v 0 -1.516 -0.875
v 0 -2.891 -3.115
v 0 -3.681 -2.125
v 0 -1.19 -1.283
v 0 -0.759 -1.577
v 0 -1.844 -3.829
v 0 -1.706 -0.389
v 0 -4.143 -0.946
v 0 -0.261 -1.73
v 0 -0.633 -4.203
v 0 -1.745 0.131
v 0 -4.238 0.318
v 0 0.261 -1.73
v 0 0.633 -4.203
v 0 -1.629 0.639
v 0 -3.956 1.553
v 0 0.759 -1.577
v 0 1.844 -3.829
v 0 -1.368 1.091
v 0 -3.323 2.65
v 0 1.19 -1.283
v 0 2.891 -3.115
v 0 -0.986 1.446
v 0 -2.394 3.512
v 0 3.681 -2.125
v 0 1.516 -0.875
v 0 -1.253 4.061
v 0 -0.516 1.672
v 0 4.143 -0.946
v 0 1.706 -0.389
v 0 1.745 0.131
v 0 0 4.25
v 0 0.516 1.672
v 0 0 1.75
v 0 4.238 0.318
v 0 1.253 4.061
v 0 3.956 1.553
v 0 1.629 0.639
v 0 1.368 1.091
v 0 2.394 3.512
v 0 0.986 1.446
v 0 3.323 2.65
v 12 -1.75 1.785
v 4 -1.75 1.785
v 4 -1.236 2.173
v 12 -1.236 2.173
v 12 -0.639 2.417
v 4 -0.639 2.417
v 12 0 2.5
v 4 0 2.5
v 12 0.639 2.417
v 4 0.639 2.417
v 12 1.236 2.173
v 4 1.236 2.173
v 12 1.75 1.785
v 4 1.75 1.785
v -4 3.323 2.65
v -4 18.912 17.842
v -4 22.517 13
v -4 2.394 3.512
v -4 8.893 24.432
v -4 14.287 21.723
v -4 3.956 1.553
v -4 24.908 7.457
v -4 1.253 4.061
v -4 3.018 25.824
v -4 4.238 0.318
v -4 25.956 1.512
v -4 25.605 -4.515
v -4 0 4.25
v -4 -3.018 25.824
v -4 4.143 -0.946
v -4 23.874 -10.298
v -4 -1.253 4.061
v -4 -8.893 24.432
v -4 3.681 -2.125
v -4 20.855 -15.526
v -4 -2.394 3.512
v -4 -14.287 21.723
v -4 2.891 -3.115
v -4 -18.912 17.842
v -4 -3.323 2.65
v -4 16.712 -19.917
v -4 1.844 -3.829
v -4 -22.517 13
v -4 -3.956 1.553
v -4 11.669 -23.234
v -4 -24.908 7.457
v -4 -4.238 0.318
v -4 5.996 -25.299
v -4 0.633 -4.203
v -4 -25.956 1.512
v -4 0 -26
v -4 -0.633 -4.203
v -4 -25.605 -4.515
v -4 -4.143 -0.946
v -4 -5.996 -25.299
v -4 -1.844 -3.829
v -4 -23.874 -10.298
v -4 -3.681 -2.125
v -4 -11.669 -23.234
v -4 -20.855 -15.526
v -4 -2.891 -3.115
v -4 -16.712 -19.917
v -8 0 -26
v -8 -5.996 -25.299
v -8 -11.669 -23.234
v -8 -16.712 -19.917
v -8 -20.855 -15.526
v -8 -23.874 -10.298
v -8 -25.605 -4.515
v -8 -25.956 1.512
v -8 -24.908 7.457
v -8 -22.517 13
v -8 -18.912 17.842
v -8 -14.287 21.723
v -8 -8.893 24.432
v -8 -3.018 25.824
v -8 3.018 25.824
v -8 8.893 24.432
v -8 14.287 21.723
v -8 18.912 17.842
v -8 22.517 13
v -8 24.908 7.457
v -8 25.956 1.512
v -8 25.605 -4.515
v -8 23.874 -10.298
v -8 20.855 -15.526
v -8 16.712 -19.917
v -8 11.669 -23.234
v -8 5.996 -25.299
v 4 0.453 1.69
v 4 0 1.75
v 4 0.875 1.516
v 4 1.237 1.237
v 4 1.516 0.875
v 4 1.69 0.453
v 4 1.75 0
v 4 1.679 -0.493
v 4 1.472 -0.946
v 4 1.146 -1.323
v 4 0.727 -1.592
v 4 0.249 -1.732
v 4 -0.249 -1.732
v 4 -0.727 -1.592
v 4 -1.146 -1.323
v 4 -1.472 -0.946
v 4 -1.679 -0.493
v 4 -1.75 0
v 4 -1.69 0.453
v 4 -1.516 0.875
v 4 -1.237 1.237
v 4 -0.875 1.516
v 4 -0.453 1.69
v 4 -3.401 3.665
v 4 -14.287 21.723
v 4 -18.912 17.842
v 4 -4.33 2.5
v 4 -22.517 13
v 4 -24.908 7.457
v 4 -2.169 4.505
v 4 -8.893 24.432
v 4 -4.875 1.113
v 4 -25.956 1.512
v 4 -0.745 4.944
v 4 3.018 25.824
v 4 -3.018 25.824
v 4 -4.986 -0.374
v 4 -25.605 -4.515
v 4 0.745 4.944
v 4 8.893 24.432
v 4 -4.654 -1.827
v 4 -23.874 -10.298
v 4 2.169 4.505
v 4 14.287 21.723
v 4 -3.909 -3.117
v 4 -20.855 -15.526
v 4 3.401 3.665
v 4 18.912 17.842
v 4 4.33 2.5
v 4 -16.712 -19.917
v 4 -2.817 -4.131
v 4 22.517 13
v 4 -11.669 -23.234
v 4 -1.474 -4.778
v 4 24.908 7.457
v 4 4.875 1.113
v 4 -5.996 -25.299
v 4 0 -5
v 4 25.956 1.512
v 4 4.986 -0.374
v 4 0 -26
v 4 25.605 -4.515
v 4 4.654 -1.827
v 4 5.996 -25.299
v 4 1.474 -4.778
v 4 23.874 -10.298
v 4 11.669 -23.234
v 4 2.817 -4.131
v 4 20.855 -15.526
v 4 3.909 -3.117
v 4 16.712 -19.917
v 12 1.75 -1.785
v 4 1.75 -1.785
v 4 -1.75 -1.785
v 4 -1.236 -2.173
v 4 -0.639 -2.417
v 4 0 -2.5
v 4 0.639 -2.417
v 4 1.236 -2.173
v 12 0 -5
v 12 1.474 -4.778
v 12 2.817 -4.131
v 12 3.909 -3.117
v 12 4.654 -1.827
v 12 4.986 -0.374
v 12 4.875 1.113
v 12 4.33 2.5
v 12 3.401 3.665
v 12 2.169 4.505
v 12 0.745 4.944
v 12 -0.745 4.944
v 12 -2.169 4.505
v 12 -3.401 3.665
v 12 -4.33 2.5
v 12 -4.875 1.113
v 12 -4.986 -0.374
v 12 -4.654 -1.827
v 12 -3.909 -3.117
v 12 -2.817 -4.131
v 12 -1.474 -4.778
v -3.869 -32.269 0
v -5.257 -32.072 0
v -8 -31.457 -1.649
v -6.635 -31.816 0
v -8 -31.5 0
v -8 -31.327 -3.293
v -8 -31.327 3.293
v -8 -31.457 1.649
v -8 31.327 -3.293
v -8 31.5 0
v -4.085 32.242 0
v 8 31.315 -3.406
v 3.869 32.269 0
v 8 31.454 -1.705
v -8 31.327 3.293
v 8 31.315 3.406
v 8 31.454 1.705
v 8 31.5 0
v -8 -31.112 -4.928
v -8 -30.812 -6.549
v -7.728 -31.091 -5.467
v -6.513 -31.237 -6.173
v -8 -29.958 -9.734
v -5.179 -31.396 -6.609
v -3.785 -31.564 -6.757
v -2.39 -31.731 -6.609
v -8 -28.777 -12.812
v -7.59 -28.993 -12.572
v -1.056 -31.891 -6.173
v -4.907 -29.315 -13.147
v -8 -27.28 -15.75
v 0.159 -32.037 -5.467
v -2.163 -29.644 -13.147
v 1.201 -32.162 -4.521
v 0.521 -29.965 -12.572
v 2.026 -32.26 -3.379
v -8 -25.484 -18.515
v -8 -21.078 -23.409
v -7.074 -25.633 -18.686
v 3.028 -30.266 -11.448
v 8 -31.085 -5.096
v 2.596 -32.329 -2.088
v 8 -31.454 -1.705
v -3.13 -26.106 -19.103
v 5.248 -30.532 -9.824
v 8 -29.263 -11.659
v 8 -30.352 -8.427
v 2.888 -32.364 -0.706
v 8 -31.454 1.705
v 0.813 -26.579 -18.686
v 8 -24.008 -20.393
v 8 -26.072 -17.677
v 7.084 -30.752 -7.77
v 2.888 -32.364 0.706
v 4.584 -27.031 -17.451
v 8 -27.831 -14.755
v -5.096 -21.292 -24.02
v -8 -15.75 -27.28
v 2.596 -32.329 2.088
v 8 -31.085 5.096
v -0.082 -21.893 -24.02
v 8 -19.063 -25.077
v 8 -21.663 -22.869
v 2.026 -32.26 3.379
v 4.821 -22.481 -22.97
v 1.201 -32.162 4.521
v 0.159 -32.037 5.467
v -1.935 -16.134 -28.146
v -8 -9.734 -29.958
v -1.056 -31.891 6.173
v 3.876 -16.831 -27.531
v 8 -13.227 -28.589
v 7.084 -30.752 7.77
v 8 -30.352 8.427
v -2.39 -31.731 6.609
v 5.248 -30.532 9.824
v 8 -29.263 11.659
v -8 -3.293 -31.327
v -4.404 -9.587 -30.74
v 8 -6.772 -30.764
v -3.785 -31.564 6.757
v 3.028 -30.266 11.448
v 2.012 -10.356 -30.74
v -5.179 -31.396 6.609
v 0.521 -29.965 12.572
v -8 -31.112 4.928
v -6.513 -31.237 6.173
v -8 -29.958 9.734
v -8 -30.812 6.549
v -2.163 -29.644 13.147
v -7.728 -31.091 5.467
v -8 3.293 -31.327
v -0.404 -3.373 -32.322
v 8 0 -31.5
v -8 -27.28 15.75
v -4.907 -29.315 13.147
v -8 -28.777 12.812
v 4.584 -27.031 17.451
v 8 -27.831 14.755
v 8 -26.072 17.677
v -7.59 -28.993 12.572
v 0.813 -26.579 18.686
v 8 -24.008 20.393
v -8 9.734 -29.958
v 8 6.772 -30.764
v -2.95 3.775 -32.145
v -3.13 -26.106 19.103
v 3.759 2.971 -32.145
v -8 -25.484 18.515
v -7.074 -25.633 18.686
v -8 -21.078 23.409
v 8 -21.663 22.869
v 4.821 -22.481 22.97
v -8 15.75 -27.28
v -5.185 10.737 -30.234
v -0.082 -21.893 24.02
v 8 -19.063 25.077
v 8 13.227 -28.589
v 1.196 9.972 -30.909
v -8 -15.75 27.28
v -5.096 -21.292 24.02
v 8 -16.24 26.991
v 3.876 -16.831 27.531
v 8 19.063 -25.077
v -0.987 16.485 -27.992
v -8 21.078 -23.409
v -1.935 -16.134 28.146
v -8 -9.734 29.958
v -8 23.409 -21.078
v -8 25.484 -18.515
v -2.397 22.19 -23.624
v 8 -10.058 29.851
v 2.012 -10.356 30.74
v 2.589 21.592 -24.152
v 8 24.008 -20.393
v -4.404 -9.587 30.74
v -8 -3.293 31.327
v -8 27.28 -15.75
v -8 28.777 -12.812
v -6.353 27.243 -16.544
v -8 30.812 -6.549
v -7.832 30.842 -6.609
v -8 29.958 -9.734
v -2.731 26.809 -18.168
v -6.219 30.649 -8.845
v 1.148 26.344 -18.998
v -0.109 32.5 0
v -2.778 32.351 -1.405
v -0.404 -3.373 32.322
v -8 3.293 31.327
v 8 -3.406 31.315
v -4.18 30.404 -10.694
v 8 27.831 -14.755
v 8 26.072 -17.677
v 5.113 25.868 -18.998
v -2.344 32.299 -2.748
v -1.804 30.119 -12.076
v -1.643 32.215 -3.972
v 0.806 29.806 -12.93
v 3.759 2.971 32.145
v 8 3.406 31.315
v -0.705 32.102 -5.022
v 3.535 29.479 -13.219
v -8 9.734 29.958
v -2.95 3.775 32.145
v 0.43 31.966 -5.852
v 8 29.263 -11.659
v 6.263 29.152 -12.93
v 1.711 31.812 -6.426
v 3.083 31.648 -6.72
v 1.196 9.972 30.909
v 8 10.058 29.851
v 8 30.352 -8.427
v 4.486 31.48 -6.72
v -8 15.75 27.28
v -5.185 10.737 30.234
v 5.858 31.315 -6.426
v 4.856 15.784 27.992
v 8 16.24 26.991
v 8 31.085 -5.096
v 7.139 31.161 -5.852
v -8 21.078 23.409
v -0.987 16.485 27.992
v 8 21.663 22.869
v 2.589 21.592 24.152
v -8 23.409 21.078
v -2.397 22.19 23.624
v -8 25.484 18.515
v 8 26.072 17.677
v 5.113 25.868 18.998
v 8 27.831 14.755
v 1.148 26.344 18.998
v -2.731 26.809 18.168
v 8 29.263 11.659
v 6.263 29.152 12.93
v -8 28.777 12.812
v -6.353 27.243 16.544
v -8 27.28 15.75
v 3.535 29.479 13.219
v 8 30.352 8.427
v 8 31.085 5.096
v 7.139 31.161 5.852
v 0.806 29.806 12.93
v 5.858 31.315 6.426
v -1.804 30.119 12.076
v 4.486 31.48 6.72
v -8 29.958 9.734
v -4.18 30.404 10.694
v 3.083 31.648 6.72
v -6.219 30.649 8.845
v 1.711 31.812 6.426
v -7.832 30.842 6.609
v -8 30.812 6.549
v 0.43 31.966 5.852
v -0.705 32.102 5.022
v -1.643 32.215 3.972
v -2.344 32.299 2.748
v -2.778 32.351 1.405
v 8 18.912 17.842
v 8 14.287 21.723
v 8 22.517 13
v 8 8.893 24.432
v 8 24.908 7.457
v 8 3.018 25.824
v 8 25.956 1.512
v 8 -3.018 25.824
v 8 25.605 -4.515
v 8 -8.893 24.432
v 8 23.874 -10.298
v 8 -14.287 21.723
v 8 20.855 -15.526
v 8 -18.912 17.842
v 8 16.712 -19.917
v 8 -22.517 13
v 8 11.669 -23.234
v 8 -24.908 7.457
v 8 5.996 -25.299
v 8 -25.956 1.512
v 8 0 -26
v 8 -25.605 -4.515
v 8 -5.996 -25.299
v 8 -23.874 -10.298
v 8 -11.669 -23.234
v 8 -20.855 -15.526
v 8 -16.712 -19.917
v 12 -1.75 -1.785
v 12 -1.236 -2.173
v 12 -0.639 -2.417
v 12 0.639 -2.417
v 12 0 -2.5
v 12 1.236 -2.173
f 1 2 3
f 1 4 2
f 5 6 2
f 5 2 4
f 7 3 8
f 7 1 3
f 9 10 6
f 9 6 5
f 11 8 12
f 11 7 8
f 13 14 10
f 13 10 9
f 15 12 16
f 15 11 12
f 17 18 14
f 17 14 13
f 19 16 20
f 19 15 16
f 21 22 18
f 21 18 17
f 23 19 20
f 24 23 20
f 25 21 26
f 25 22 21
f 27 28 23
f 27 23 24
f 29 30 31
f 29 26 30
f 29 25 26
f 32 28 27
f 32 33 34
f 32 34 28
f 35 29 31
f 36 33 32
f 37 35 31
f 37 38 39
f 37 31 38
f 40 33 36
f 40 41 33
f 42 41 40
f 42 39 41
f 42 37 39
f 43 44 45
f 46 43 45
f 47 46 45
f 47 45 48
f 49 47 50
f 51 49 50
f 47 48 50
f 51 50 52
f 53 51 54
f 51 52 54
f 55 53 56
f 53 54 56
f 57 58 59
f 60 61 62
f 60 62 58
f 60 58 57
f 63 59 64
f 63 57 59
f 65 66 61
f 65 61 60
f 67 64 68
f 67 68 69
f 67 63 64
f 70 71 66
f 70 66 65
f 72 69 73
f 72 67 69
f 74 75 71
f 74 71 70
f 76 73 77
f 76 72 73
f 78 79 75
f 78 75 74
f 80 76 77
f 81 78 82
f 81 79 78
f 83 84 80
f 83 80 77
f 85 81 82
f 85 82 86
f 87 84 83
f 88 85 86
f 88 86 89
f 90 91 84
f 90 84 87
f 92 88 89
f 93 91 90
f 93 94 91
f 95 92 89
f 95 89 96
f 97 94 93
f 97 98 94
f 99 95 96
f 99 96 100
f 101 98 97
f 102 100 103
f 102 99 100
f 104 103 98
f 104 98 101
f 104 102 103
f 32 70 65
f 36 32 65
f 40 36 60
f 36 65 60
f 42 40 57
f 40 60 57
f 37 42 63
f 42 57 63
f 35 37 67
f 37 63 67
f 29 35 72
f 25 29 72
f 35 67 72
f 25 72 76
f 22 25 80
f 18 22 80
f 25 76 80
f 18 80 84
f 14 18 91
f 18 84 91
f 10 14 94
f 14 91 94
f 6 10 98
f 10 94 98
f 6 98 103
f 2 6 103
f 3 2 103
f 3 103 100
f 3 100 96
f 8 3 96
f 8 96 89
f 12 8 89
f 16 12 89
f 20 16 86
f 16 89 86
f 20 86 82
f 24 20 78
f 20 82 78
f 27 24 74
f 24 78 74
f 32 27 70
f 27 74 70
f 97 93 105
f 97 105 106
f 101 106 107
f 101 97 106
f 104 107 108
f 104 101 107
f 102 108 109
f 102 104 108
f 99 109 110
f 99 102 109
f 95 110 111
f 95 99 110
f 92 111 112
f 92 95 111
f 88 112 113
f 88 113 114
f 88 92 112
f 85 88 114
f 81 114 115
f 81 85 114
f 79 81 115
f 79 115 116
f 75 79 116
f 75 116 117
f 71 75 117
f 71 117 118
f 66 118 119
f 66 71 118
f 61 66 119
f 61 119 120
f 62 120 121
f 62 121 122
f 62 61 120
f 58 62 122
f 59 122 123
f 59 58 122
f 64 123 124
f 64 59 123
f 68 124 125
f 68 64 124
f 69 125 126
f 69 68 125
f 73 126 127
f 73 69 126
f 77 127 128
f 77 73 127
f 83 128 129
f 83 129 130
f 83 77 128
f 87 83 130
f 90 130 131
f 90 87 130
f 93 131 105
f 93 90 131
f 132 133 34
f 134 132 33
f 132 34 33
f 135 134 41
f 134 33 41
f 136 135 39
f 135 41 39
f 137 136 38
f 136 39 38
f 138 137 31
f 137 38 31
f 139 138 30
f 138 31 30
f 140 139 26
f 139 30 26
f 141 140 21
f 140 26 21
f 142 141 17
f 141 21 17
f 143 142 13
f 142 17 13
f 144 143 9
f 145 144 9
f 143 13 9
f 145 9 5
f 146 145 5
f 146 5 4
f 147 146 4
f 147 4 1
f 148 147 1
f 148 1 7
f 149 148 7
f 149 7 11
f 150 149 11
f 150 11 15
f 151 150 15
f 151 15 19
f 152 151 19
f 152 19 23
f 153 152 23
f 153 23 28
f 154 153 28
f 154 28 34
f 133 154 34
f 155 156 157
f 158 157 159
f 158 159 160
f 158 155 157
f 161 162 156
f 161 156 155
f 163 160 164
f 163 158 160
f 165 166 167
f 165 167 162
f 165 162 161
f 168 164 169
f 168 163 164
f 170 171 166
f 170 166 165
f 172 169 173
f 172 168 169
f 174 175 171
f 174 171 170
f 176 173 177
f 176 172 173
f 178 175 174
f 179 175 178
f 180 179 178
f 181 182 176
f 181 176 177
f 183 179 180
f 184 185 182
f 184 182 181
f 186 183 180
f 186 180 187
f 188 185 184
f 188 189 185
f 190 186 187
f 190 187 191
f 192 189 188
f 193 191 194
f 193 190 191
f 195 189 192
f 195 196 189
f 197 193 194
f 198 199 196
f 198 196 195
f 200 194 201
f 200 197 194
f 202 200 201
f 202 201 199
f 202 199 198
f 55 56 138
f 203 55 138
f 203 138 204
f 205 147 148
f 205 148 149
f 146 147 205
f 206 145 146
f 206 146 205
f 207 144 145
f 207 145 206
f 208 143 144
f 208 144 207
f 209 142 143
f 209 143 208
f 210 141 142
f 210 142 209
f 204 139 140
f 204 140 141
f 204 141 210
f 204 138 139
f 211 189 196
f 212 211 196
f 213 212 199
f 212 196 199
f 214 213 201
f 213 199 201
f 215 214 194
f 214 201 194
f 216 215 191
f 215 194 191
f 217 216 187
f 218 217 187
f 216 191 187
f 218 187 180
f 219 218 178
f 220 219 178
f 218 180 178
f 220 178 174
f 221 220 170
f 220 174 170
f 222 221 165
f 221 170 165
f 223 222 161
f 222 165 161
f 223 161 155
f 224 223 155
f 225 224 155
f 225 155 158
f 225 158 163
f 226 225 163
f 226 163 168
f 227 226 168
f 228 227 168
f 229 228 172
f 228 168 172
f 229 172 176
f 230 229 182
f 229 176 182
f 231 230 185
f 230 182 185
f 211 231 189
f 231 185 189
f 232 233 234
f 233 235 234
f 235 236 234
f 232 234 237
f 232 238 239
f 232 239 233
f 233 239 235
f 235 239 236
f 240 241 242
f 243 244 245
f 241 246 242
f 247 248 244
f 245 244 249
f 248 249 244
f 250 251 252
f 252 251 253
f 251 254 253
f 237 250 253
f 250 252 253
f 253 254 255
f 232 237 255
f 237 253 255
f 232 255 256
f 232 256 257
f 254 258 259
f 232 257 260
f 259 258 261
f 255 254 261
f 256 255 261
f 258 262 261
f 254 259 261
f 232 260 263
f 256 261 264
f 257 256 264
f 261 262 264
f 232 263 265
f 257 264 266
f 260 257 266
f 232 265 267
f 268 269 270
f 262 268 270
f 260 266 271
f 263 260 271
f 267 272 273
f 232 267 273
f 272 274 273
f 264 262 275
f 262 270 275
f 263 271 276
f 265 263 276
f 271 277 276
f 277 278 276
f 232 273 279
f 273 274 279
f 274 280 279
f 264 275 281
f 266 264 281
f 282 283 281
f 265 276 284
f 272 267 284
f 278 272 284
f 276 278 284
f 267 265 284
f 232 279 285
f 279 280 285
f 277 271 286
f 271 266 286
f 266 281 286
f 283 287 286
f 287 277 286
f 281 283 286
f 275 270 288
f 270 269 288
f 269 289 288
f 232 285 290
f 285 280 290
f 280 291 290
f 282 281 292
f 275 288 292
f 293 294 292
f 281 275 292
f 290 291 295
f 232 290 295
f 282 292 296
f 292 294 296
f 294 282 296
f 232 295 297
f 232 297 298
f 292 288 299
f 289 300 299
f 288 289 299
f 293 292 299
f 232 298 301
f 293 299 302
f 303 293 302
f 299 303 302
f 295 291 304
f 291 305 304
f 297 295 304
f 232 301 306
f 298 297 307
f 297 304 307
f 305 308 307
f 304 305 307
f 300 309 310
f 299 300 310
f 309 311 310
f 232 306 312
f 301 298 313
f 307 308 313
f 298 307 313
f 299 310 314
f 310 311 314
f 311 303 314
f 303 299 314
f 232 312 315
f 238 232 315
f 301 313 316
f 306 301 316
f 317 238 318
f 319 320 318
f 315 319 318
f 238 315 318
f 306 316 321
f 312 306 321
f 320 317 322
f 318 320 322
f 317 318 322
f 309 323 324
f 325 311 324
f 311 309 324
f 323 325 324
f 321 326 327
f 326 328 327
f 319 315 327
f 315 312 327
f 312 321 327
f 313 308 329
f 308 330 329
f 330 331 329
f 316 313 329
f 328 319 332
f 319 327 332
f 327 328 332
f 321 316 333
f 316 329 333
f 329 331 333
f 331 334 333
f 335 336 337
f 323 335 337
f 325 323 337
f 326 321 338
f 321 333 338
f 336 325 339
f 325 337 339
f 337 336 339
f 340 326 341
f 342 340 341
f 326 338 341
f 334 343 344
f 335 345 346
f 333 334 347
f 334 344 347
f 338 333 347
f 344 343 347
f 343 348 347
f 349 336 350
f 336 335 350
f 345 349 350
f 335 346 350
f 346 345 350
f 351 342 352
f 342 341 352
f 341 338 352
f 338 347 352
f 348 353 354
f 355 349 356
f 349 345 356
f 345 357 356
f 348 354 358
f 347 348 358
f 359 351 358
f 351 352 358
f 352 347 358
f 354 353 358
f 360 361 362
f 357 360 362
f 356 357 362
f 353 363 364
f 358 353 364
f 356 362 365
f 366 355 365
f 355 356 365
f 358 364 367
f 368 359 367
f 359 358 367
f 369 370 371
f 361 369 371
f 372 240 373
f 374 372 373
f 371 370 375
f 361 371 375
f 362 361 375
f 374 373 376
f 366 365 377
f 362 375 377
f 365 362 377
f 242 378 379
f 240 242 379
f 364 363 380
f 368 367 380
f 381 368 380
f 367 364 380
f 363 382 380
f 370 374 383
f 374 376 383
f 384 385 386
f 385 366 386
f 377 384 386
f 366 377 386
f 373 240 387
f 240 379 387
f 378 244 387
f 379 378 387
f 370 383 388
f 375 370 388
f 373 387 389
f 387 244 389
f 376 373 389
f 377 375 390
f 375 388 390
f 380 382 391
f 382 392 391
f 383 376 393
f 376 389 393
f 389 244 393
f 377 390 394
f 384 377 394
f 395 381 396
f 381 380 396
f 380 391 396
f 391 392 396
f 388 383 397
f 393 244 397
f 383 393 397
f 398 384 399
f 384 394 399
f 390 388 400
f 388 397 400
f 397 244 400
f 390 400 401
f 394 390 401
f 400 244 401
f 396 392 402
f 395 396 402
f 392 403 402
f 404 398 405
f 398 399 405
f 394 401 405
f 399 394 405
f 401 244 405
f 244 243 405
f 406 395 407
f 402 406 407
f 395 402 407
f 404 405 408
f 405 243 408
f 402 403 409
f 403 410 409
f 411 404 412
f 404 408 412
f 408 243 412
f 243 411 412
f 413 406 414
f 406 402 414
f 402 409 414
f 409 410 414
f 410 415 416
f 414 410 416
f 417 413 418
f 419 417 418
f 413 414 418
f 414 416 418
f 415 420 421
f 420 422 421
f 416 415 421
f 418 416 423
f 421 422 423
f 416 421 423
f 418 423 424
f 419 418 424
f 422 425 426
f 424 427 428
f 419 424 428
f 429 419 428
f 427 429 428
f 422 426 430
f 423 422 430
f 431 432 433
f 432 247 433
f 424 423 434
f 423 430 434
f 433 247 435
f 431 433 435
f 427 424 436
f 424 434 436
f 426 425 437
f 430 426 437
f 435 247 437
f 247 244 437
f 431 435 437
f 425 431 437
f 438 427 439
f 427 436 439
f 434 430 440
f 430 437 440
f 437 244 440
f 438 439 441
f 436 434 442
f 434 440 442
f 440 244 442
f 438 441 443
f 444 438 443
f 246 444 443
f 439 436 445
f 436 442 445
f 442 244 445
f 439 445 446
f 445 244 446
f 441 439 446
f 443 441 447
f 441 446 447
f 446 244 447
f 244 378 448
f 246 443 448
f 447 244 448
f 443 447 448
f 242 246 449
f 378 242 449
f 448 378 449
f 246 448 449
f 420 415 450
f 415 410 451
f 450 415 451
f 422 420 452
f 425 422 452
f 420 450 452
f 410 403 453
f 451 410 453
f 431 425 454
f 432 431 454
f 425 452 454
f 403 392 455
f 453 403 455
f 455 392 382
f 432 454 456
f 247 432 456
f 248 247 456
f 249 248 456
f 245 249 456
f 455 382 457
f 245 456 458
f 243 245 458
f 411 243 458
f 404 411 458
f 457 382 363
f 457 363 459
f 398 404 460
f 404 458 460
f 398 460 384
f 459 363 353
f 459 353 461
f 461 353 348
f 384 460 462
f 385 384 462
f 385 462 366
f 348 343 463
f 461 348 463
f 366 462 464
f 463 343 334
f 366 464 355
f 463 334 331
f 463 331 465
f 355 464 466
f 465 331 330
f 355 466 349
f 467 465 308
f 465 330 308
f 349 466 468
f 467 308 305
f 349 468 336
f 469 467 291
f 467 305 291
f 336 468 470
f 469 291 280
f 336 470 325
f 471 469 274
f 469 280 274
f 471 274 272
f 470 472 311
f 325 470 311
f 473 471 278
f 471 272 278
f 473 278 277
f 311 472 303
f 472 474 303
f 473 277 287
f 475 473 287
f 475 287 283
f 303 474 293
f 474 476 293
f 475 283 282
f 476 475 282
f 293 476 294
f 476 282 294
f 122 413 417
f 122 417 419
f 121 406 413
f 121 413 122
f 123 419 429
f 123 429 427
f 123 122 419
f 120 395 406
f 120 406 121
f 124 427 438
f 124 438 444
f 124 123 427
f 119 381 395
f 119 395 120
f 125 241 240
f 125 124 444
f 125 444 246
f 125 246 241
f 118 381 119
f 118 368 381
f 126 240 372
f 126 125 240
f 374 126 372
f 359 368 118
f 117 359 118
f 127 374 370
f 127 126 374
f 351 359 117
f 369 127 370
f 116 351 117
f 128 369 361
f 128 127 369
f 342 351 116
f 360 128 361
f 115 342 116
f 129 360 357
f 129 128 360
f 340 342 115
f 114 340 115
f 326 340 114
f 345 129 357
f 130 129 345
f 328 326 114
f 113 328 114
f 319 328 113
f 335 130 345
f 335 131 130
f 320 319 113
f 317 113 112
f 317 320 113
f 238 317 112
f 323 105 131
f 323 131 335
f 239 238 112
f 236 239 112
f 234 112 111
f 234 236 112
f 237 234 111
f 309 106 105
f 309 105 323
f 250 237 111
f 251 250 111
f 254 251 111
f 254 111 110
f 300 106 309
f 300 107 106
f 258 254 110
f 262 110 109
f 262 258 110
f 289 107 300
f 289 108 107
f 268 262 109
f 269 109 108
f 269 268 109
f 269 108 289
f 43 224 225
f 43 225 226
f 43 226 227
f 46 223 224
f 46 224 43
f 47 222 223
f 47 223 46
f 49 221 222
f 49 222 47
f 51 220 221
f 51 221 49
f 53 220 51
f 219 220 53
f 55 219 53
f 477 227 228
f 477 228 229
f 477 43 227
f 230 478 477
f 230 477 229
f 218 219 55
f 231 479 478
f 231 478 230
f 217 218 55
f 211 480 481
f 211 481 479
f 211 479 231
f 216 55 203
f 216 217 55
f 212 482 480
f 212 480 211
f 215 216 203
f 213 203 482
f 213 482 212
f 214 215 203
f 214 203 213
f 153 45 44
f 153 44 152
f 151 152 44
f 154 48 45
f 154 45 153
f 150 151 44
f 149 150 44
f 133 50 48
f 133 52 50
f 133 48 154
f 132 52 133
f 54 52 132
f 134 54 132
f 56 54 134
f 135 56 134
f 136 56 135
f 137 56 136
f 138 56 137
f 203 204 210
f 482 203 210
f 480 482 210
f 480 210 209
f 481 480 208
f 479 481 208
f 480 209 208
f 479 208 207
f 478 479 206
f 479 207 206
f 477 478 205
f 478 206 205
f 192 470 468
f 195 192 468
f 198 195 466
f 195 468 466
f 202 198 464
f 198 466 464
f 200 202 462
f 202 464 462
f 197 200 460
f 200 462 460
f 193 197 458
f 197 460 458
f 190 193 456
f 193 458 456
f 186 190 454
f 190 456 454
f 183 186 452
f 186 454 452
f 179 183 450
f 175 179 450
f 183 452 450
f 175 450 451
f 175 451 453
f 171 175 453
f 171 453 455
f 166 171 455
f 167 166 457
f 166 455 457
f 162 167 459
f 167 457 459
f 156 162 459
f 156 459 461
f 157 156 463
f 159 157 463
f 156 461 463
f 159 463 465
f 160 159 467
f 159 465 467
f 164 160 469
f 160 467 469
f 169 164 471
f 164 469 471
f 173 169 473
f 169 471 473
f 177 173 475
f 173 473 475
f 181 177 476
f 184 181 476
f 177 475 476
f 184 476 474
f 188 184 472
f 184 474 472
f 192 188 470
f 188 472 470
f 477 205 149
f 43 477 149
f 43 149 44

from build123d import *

# Parameters (mm, degrees)
CUT_EXTRUDE_1_DEPTH      = 57.291651246
CUT_EXTRUDE_1_DEPTH_BACK = 57.291651246
SKETCH_2_OUTSIDE_W       = 89.516
SKETCH_2_OUTSIDE_H       = 89.516
SKETCH_2_OUTSIDE_W_2     = 16
SKETCH_2_OUTSIDE_H_2     = 65
SKETCH_3_R               = 26
CUT_EXTRUDE_2_DEPTH      = 4
CUT_EXTRUDE_START        = -4
SKETCH_4_R               = 26
CUT_EXTRUDE_3_DEPTH      = 4
SKETCH_5_R               = 5
EXTRUDE_2_DEPTH          = 8
SKETCH_6_R               = 4.25
CUT_EXTRUDE_6_DEPTH      = 4
SKETCH_7_R               = 1.75
CUT_EXTRUDE_7_DEPTH      = 48.502631506


with BuildPart() as part:
    # 草图1 → 旋转3 (revolve)
    with BuildSketch(Plane.XY):
        with BuildLine():
            Line((3.869127368, 32.268868177), (-3.869127368, -32.268868177))
            ThreePointArc((-3.869127368, -32.268868177), (-32.268868177, 3.869127368), (3.869127368, 32.268868177))
        make_face()
    revolve(axis=Axis((3.869127368, 32.268868177, 0), (-0.11905007287477921, -0.9928882515915424, 0)))

    # 草图2 outside → 切除-拉伸1 (cut, two sides: drawn at the far end of the back side and taken through both)
    with BuildSketch(Plane(origin=(0, 0, 0), x_dir=(1, 0, 0), z_dir=(0, 1, 0)).offset(-CUT_EXTRUDE_1_DEPTH_BACK)):
        Rectangle(SKETCH_2_OUTSIDE_W, SKETCH_2_OUTSIDE_H)
        Rectangle(SKETCH_2_OUTSIDE_W_2, SKETCH_2_OUTSIDE_H_2, mode=Mode.SUBTRACT)
    extrude(amount=CUT_EXTRUDE_1_DEPTH + CUT_EXTRUDE_1_DEPTH_BACK, mode=Mode.SUBTRACT)

    # 草图3 → 切除-拉伸2 (cut)
    with BuildSketch(Plane(origin=(8, 0, 0), x_dir=(0, 0, -1), z_dir=(1, 0, 0))):
        Circle(SKETCH_3_R)
    extrude(amount=-CUT_EXTRUDE_2_DEPTH, mode=Mode.SUBTRACT)

    # 草图4 → 切除-拉伸3 (cut)
    with BuildSketch(Plane.ZY.offset(8).offset(CUT_EXTRUDE_START)):
        with Locations(Location((0, 0, 0), (0, 0, 180))):
            Circle(SKETCH_4_R)
    extrude(amount=CUT_EXTRUDE_3_DEPTH, mode=Mode.SUBTRACT)

    # 草图5 → 凸台-拉伸2 (add)
    with BuildSketch(Plane(origin=(4, 0, 0), x_dir=(0, 0, -1), z_dir=(1, 0, 0))):
        Circle(SKETCH_5_R)
        with BuildLine():
            Line((-1.785357107, 1.75), (1.785357107, 1.75))
            ThreePointArc((1.785357107, 1.75), (2.5, 0), (1.785357107, -1.75))
            Line((1.785357107, -1.75), (-1.785357107, -1.75))
            ThreePointArc((-1.785357107, -1.75), (-2.5, 0), (-1.785357107, 1.75))
        make_face(mode=Mode.SUBTRACT)
    extrude(amount=EXTRUDE_2_DEPTH)

    # 草图6 → 切除-拉伸6 (cut)
    with BuildSketch(Plane.ZY.offset(8).offset(CUT_EXTRUDE_START)):
        Circle(SKETCH_6_R)
    extrude(amount=-CUT_EXTRUDE_6_DEPTH, mode=Mode.SUBTRACT)

    # 草图7 → 切除-拉伸7 (cut, through all)
    with BuildSketch(Plane.ZY):
        Circle(SKETCH_7_R)
    extrude(amount=-CUT_EXTRUDE_7_DEPTH, mode=Mode.SUBTRACT)


solid = part.part
